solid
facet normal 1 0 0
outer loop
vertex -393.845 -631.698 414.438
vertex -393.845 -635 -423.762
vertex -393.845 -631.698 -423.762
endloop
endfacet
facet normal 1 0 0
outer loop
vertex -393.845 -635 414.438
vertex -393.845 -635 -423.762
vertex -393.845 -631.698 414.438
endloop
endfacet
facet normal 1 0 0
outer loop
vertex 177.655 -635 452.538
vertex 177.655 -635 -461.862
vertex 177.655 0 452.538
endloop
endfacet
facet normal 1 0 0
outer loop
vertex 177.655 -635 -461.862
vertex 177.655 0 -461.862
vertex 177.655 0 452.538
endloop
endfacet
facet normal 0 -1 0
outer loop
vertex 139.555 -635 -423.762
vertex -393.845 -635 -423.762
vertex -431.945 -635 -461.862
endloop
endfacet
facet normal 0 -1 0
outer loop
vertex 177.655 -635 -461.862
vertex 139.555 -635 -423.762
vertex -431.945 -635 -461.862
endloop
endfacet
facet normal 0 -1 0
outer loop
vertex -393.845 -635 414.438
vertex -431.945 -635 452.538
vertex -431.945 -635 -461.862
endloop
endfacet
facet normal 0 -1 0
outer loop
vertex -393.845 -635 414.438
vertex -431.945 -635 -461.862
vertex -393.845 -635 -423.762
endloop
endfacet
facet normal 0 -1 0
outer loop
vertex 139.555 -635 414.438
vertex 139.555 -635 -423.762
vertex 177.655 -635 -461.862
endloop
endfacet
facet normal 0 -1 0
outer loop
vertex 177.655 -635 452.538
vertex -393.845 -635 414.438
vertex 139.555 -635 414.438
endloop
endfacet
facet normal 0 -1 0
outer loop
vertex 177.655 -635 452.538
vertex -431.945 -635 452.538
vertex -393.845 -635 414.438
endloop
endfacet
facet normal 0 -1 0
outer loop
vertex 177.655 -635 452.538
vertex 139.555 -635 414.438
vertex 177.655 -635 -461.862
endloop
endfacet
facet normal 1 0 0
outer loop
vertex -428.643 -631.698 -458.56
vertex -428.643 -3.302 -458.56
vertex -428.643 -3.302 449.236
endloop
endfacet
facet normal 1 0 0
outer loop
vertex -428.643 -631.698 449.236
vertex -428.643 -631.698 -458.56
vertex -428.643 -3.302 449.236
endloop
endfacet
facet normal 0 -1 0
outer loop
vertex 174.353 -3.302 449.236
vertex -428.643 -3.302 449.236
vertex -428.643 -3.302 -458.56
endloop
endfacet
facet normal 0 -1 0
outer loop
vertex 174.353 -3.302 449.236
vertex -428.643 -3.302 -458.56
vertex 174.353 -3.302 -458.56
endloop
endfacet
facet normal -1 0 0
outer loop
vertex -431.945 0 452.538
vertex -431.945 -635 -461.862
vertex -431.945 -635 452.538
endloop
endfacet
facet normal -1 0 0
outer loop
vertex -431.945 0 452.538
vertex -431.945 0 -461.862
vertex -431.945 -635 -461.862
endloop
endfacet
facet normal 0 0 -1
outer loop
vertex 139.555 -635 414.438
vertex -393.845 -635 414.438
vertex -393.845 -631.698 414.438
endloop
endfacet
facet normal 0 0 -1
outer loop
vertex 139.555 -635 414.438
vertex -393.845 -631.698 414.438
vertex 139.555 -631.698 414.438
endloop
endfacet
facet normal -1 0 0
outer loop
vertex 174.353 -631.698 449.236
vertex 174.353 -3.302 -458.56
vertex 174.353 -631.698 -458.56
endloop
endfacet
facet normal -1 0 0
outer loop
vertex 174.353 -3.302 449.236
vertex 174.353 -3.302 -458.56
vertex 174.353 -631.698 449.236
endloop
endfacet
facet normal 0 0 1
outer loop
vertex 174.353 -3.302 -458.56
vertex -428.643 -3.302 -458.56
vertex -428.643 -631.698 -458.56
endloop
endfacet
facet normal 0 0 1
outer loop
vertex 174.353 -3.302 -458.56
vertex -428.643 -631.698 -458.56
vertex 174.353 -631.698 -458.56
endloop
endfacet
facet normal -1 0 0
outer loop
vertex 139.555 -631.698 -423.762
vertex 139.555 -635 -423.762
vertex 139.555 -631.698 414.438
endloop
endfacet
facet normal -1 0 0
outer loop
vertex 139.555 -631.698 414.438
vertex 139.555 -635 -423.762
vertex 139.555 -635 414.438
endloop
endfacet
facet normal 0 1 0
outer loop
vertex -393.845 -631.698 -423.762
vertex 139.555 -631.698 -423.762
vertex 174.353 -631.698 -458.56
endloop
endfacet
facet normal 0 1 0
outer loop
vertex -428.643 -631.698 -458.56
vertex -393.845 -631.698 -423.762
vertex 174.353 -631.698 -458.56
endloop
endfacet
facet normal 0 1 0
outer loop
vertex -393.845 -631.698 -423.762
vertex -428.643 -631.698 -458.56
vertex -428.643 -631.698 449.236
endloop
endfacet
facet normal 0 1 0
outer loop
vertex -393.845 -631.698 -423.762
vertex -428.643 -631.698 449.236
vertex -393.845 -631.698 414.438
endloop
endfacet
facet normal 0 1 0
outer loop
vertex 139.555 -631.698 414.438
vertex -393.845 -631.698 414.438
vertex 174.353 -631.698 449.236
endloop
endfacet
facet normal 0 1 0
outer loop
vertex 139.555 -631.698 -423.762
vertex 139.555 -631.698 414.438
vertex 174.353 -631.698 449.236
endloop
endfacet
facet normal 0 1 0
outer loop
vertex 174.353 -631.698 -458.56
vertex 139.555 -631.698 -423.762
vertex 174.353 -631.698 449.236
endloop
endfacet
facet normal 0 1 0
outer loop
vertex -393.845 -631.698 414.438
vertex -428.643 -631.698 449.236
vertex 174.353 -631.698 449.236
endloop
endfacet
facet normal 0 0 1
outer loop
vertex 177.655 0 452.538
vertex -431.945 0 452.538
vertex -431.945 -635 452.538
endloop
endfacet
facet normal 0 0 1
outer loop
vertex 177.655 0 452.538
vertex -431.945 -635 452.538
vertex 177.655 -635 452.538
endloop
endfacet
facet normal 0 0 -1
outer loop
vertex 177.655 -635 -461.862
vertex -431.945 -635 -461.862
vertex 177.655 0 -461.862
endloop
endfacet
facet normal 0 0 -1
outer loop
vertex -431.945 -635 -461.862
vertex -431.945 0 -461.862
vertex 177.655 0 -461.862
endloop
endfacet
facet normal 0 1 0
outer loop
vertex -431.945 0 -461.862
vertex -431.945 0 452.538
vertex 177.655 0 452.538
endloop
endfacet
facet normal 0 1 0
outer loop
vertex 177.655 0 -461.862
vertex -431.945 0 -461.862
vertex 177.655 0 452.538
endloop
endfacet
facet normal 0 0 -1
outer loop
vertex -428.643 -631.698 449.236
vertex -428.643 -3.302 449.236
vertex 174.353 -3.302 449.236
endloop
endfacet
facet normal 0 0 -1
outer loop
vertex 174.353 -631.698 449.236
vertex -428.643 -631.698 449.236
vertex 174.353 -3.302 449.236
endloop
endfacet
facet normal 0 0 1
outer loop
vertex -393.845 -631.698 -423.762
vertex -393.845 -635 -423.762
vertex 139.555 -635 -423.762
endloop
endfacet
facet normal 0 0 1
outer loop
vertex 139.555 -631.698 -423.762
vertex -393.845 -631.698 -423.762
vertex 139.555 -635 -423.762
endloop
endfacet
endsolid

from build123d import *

# Parameters (mm, degrees)
F0_W     = 609.6
F0_H     = 914.4
F1_DEPTH = 609.6
F2_DEPTH = 25.4
F3_T     = -3.302
F4_W     = 533.4
F4_H     = 838.2
F5_DEPTH = 584.2


with BuildPart() as f1:
    # F0 (on Front) → F1 (new body)
    with BuildSketch(Plane.XZ):
        with Locations((-127.1454390585, -4.6617306446)):
            Rectangle(F0_W, F0_H)
    extrude(amount=F1_DEPTH)

    # F2 (add): a face of the model
    f2_faces = [f1.faces().sort_by_distance(p)[0] for p in [
        (-127.1454390585, -609.6, -4.6617306446),
    ]]
    extrude(f2_faces, amount=F2_DEPTH)

    # F3 (hollow: no face is removed)
    offset(amount=F3_T, mode=Mode.SUBTRACT)

    # F4 (on face) → F5 (cut)
    with BuildSketch(Plane.XZ.offset(635)):
        with Locations((-127.1454390585, -4.6617306446)):
            Rectangle(F4_W, F4_H)
    extrude(amount=-F5_DEPTH, mode=Mode.SUBTRACT)


solid = f1.part
